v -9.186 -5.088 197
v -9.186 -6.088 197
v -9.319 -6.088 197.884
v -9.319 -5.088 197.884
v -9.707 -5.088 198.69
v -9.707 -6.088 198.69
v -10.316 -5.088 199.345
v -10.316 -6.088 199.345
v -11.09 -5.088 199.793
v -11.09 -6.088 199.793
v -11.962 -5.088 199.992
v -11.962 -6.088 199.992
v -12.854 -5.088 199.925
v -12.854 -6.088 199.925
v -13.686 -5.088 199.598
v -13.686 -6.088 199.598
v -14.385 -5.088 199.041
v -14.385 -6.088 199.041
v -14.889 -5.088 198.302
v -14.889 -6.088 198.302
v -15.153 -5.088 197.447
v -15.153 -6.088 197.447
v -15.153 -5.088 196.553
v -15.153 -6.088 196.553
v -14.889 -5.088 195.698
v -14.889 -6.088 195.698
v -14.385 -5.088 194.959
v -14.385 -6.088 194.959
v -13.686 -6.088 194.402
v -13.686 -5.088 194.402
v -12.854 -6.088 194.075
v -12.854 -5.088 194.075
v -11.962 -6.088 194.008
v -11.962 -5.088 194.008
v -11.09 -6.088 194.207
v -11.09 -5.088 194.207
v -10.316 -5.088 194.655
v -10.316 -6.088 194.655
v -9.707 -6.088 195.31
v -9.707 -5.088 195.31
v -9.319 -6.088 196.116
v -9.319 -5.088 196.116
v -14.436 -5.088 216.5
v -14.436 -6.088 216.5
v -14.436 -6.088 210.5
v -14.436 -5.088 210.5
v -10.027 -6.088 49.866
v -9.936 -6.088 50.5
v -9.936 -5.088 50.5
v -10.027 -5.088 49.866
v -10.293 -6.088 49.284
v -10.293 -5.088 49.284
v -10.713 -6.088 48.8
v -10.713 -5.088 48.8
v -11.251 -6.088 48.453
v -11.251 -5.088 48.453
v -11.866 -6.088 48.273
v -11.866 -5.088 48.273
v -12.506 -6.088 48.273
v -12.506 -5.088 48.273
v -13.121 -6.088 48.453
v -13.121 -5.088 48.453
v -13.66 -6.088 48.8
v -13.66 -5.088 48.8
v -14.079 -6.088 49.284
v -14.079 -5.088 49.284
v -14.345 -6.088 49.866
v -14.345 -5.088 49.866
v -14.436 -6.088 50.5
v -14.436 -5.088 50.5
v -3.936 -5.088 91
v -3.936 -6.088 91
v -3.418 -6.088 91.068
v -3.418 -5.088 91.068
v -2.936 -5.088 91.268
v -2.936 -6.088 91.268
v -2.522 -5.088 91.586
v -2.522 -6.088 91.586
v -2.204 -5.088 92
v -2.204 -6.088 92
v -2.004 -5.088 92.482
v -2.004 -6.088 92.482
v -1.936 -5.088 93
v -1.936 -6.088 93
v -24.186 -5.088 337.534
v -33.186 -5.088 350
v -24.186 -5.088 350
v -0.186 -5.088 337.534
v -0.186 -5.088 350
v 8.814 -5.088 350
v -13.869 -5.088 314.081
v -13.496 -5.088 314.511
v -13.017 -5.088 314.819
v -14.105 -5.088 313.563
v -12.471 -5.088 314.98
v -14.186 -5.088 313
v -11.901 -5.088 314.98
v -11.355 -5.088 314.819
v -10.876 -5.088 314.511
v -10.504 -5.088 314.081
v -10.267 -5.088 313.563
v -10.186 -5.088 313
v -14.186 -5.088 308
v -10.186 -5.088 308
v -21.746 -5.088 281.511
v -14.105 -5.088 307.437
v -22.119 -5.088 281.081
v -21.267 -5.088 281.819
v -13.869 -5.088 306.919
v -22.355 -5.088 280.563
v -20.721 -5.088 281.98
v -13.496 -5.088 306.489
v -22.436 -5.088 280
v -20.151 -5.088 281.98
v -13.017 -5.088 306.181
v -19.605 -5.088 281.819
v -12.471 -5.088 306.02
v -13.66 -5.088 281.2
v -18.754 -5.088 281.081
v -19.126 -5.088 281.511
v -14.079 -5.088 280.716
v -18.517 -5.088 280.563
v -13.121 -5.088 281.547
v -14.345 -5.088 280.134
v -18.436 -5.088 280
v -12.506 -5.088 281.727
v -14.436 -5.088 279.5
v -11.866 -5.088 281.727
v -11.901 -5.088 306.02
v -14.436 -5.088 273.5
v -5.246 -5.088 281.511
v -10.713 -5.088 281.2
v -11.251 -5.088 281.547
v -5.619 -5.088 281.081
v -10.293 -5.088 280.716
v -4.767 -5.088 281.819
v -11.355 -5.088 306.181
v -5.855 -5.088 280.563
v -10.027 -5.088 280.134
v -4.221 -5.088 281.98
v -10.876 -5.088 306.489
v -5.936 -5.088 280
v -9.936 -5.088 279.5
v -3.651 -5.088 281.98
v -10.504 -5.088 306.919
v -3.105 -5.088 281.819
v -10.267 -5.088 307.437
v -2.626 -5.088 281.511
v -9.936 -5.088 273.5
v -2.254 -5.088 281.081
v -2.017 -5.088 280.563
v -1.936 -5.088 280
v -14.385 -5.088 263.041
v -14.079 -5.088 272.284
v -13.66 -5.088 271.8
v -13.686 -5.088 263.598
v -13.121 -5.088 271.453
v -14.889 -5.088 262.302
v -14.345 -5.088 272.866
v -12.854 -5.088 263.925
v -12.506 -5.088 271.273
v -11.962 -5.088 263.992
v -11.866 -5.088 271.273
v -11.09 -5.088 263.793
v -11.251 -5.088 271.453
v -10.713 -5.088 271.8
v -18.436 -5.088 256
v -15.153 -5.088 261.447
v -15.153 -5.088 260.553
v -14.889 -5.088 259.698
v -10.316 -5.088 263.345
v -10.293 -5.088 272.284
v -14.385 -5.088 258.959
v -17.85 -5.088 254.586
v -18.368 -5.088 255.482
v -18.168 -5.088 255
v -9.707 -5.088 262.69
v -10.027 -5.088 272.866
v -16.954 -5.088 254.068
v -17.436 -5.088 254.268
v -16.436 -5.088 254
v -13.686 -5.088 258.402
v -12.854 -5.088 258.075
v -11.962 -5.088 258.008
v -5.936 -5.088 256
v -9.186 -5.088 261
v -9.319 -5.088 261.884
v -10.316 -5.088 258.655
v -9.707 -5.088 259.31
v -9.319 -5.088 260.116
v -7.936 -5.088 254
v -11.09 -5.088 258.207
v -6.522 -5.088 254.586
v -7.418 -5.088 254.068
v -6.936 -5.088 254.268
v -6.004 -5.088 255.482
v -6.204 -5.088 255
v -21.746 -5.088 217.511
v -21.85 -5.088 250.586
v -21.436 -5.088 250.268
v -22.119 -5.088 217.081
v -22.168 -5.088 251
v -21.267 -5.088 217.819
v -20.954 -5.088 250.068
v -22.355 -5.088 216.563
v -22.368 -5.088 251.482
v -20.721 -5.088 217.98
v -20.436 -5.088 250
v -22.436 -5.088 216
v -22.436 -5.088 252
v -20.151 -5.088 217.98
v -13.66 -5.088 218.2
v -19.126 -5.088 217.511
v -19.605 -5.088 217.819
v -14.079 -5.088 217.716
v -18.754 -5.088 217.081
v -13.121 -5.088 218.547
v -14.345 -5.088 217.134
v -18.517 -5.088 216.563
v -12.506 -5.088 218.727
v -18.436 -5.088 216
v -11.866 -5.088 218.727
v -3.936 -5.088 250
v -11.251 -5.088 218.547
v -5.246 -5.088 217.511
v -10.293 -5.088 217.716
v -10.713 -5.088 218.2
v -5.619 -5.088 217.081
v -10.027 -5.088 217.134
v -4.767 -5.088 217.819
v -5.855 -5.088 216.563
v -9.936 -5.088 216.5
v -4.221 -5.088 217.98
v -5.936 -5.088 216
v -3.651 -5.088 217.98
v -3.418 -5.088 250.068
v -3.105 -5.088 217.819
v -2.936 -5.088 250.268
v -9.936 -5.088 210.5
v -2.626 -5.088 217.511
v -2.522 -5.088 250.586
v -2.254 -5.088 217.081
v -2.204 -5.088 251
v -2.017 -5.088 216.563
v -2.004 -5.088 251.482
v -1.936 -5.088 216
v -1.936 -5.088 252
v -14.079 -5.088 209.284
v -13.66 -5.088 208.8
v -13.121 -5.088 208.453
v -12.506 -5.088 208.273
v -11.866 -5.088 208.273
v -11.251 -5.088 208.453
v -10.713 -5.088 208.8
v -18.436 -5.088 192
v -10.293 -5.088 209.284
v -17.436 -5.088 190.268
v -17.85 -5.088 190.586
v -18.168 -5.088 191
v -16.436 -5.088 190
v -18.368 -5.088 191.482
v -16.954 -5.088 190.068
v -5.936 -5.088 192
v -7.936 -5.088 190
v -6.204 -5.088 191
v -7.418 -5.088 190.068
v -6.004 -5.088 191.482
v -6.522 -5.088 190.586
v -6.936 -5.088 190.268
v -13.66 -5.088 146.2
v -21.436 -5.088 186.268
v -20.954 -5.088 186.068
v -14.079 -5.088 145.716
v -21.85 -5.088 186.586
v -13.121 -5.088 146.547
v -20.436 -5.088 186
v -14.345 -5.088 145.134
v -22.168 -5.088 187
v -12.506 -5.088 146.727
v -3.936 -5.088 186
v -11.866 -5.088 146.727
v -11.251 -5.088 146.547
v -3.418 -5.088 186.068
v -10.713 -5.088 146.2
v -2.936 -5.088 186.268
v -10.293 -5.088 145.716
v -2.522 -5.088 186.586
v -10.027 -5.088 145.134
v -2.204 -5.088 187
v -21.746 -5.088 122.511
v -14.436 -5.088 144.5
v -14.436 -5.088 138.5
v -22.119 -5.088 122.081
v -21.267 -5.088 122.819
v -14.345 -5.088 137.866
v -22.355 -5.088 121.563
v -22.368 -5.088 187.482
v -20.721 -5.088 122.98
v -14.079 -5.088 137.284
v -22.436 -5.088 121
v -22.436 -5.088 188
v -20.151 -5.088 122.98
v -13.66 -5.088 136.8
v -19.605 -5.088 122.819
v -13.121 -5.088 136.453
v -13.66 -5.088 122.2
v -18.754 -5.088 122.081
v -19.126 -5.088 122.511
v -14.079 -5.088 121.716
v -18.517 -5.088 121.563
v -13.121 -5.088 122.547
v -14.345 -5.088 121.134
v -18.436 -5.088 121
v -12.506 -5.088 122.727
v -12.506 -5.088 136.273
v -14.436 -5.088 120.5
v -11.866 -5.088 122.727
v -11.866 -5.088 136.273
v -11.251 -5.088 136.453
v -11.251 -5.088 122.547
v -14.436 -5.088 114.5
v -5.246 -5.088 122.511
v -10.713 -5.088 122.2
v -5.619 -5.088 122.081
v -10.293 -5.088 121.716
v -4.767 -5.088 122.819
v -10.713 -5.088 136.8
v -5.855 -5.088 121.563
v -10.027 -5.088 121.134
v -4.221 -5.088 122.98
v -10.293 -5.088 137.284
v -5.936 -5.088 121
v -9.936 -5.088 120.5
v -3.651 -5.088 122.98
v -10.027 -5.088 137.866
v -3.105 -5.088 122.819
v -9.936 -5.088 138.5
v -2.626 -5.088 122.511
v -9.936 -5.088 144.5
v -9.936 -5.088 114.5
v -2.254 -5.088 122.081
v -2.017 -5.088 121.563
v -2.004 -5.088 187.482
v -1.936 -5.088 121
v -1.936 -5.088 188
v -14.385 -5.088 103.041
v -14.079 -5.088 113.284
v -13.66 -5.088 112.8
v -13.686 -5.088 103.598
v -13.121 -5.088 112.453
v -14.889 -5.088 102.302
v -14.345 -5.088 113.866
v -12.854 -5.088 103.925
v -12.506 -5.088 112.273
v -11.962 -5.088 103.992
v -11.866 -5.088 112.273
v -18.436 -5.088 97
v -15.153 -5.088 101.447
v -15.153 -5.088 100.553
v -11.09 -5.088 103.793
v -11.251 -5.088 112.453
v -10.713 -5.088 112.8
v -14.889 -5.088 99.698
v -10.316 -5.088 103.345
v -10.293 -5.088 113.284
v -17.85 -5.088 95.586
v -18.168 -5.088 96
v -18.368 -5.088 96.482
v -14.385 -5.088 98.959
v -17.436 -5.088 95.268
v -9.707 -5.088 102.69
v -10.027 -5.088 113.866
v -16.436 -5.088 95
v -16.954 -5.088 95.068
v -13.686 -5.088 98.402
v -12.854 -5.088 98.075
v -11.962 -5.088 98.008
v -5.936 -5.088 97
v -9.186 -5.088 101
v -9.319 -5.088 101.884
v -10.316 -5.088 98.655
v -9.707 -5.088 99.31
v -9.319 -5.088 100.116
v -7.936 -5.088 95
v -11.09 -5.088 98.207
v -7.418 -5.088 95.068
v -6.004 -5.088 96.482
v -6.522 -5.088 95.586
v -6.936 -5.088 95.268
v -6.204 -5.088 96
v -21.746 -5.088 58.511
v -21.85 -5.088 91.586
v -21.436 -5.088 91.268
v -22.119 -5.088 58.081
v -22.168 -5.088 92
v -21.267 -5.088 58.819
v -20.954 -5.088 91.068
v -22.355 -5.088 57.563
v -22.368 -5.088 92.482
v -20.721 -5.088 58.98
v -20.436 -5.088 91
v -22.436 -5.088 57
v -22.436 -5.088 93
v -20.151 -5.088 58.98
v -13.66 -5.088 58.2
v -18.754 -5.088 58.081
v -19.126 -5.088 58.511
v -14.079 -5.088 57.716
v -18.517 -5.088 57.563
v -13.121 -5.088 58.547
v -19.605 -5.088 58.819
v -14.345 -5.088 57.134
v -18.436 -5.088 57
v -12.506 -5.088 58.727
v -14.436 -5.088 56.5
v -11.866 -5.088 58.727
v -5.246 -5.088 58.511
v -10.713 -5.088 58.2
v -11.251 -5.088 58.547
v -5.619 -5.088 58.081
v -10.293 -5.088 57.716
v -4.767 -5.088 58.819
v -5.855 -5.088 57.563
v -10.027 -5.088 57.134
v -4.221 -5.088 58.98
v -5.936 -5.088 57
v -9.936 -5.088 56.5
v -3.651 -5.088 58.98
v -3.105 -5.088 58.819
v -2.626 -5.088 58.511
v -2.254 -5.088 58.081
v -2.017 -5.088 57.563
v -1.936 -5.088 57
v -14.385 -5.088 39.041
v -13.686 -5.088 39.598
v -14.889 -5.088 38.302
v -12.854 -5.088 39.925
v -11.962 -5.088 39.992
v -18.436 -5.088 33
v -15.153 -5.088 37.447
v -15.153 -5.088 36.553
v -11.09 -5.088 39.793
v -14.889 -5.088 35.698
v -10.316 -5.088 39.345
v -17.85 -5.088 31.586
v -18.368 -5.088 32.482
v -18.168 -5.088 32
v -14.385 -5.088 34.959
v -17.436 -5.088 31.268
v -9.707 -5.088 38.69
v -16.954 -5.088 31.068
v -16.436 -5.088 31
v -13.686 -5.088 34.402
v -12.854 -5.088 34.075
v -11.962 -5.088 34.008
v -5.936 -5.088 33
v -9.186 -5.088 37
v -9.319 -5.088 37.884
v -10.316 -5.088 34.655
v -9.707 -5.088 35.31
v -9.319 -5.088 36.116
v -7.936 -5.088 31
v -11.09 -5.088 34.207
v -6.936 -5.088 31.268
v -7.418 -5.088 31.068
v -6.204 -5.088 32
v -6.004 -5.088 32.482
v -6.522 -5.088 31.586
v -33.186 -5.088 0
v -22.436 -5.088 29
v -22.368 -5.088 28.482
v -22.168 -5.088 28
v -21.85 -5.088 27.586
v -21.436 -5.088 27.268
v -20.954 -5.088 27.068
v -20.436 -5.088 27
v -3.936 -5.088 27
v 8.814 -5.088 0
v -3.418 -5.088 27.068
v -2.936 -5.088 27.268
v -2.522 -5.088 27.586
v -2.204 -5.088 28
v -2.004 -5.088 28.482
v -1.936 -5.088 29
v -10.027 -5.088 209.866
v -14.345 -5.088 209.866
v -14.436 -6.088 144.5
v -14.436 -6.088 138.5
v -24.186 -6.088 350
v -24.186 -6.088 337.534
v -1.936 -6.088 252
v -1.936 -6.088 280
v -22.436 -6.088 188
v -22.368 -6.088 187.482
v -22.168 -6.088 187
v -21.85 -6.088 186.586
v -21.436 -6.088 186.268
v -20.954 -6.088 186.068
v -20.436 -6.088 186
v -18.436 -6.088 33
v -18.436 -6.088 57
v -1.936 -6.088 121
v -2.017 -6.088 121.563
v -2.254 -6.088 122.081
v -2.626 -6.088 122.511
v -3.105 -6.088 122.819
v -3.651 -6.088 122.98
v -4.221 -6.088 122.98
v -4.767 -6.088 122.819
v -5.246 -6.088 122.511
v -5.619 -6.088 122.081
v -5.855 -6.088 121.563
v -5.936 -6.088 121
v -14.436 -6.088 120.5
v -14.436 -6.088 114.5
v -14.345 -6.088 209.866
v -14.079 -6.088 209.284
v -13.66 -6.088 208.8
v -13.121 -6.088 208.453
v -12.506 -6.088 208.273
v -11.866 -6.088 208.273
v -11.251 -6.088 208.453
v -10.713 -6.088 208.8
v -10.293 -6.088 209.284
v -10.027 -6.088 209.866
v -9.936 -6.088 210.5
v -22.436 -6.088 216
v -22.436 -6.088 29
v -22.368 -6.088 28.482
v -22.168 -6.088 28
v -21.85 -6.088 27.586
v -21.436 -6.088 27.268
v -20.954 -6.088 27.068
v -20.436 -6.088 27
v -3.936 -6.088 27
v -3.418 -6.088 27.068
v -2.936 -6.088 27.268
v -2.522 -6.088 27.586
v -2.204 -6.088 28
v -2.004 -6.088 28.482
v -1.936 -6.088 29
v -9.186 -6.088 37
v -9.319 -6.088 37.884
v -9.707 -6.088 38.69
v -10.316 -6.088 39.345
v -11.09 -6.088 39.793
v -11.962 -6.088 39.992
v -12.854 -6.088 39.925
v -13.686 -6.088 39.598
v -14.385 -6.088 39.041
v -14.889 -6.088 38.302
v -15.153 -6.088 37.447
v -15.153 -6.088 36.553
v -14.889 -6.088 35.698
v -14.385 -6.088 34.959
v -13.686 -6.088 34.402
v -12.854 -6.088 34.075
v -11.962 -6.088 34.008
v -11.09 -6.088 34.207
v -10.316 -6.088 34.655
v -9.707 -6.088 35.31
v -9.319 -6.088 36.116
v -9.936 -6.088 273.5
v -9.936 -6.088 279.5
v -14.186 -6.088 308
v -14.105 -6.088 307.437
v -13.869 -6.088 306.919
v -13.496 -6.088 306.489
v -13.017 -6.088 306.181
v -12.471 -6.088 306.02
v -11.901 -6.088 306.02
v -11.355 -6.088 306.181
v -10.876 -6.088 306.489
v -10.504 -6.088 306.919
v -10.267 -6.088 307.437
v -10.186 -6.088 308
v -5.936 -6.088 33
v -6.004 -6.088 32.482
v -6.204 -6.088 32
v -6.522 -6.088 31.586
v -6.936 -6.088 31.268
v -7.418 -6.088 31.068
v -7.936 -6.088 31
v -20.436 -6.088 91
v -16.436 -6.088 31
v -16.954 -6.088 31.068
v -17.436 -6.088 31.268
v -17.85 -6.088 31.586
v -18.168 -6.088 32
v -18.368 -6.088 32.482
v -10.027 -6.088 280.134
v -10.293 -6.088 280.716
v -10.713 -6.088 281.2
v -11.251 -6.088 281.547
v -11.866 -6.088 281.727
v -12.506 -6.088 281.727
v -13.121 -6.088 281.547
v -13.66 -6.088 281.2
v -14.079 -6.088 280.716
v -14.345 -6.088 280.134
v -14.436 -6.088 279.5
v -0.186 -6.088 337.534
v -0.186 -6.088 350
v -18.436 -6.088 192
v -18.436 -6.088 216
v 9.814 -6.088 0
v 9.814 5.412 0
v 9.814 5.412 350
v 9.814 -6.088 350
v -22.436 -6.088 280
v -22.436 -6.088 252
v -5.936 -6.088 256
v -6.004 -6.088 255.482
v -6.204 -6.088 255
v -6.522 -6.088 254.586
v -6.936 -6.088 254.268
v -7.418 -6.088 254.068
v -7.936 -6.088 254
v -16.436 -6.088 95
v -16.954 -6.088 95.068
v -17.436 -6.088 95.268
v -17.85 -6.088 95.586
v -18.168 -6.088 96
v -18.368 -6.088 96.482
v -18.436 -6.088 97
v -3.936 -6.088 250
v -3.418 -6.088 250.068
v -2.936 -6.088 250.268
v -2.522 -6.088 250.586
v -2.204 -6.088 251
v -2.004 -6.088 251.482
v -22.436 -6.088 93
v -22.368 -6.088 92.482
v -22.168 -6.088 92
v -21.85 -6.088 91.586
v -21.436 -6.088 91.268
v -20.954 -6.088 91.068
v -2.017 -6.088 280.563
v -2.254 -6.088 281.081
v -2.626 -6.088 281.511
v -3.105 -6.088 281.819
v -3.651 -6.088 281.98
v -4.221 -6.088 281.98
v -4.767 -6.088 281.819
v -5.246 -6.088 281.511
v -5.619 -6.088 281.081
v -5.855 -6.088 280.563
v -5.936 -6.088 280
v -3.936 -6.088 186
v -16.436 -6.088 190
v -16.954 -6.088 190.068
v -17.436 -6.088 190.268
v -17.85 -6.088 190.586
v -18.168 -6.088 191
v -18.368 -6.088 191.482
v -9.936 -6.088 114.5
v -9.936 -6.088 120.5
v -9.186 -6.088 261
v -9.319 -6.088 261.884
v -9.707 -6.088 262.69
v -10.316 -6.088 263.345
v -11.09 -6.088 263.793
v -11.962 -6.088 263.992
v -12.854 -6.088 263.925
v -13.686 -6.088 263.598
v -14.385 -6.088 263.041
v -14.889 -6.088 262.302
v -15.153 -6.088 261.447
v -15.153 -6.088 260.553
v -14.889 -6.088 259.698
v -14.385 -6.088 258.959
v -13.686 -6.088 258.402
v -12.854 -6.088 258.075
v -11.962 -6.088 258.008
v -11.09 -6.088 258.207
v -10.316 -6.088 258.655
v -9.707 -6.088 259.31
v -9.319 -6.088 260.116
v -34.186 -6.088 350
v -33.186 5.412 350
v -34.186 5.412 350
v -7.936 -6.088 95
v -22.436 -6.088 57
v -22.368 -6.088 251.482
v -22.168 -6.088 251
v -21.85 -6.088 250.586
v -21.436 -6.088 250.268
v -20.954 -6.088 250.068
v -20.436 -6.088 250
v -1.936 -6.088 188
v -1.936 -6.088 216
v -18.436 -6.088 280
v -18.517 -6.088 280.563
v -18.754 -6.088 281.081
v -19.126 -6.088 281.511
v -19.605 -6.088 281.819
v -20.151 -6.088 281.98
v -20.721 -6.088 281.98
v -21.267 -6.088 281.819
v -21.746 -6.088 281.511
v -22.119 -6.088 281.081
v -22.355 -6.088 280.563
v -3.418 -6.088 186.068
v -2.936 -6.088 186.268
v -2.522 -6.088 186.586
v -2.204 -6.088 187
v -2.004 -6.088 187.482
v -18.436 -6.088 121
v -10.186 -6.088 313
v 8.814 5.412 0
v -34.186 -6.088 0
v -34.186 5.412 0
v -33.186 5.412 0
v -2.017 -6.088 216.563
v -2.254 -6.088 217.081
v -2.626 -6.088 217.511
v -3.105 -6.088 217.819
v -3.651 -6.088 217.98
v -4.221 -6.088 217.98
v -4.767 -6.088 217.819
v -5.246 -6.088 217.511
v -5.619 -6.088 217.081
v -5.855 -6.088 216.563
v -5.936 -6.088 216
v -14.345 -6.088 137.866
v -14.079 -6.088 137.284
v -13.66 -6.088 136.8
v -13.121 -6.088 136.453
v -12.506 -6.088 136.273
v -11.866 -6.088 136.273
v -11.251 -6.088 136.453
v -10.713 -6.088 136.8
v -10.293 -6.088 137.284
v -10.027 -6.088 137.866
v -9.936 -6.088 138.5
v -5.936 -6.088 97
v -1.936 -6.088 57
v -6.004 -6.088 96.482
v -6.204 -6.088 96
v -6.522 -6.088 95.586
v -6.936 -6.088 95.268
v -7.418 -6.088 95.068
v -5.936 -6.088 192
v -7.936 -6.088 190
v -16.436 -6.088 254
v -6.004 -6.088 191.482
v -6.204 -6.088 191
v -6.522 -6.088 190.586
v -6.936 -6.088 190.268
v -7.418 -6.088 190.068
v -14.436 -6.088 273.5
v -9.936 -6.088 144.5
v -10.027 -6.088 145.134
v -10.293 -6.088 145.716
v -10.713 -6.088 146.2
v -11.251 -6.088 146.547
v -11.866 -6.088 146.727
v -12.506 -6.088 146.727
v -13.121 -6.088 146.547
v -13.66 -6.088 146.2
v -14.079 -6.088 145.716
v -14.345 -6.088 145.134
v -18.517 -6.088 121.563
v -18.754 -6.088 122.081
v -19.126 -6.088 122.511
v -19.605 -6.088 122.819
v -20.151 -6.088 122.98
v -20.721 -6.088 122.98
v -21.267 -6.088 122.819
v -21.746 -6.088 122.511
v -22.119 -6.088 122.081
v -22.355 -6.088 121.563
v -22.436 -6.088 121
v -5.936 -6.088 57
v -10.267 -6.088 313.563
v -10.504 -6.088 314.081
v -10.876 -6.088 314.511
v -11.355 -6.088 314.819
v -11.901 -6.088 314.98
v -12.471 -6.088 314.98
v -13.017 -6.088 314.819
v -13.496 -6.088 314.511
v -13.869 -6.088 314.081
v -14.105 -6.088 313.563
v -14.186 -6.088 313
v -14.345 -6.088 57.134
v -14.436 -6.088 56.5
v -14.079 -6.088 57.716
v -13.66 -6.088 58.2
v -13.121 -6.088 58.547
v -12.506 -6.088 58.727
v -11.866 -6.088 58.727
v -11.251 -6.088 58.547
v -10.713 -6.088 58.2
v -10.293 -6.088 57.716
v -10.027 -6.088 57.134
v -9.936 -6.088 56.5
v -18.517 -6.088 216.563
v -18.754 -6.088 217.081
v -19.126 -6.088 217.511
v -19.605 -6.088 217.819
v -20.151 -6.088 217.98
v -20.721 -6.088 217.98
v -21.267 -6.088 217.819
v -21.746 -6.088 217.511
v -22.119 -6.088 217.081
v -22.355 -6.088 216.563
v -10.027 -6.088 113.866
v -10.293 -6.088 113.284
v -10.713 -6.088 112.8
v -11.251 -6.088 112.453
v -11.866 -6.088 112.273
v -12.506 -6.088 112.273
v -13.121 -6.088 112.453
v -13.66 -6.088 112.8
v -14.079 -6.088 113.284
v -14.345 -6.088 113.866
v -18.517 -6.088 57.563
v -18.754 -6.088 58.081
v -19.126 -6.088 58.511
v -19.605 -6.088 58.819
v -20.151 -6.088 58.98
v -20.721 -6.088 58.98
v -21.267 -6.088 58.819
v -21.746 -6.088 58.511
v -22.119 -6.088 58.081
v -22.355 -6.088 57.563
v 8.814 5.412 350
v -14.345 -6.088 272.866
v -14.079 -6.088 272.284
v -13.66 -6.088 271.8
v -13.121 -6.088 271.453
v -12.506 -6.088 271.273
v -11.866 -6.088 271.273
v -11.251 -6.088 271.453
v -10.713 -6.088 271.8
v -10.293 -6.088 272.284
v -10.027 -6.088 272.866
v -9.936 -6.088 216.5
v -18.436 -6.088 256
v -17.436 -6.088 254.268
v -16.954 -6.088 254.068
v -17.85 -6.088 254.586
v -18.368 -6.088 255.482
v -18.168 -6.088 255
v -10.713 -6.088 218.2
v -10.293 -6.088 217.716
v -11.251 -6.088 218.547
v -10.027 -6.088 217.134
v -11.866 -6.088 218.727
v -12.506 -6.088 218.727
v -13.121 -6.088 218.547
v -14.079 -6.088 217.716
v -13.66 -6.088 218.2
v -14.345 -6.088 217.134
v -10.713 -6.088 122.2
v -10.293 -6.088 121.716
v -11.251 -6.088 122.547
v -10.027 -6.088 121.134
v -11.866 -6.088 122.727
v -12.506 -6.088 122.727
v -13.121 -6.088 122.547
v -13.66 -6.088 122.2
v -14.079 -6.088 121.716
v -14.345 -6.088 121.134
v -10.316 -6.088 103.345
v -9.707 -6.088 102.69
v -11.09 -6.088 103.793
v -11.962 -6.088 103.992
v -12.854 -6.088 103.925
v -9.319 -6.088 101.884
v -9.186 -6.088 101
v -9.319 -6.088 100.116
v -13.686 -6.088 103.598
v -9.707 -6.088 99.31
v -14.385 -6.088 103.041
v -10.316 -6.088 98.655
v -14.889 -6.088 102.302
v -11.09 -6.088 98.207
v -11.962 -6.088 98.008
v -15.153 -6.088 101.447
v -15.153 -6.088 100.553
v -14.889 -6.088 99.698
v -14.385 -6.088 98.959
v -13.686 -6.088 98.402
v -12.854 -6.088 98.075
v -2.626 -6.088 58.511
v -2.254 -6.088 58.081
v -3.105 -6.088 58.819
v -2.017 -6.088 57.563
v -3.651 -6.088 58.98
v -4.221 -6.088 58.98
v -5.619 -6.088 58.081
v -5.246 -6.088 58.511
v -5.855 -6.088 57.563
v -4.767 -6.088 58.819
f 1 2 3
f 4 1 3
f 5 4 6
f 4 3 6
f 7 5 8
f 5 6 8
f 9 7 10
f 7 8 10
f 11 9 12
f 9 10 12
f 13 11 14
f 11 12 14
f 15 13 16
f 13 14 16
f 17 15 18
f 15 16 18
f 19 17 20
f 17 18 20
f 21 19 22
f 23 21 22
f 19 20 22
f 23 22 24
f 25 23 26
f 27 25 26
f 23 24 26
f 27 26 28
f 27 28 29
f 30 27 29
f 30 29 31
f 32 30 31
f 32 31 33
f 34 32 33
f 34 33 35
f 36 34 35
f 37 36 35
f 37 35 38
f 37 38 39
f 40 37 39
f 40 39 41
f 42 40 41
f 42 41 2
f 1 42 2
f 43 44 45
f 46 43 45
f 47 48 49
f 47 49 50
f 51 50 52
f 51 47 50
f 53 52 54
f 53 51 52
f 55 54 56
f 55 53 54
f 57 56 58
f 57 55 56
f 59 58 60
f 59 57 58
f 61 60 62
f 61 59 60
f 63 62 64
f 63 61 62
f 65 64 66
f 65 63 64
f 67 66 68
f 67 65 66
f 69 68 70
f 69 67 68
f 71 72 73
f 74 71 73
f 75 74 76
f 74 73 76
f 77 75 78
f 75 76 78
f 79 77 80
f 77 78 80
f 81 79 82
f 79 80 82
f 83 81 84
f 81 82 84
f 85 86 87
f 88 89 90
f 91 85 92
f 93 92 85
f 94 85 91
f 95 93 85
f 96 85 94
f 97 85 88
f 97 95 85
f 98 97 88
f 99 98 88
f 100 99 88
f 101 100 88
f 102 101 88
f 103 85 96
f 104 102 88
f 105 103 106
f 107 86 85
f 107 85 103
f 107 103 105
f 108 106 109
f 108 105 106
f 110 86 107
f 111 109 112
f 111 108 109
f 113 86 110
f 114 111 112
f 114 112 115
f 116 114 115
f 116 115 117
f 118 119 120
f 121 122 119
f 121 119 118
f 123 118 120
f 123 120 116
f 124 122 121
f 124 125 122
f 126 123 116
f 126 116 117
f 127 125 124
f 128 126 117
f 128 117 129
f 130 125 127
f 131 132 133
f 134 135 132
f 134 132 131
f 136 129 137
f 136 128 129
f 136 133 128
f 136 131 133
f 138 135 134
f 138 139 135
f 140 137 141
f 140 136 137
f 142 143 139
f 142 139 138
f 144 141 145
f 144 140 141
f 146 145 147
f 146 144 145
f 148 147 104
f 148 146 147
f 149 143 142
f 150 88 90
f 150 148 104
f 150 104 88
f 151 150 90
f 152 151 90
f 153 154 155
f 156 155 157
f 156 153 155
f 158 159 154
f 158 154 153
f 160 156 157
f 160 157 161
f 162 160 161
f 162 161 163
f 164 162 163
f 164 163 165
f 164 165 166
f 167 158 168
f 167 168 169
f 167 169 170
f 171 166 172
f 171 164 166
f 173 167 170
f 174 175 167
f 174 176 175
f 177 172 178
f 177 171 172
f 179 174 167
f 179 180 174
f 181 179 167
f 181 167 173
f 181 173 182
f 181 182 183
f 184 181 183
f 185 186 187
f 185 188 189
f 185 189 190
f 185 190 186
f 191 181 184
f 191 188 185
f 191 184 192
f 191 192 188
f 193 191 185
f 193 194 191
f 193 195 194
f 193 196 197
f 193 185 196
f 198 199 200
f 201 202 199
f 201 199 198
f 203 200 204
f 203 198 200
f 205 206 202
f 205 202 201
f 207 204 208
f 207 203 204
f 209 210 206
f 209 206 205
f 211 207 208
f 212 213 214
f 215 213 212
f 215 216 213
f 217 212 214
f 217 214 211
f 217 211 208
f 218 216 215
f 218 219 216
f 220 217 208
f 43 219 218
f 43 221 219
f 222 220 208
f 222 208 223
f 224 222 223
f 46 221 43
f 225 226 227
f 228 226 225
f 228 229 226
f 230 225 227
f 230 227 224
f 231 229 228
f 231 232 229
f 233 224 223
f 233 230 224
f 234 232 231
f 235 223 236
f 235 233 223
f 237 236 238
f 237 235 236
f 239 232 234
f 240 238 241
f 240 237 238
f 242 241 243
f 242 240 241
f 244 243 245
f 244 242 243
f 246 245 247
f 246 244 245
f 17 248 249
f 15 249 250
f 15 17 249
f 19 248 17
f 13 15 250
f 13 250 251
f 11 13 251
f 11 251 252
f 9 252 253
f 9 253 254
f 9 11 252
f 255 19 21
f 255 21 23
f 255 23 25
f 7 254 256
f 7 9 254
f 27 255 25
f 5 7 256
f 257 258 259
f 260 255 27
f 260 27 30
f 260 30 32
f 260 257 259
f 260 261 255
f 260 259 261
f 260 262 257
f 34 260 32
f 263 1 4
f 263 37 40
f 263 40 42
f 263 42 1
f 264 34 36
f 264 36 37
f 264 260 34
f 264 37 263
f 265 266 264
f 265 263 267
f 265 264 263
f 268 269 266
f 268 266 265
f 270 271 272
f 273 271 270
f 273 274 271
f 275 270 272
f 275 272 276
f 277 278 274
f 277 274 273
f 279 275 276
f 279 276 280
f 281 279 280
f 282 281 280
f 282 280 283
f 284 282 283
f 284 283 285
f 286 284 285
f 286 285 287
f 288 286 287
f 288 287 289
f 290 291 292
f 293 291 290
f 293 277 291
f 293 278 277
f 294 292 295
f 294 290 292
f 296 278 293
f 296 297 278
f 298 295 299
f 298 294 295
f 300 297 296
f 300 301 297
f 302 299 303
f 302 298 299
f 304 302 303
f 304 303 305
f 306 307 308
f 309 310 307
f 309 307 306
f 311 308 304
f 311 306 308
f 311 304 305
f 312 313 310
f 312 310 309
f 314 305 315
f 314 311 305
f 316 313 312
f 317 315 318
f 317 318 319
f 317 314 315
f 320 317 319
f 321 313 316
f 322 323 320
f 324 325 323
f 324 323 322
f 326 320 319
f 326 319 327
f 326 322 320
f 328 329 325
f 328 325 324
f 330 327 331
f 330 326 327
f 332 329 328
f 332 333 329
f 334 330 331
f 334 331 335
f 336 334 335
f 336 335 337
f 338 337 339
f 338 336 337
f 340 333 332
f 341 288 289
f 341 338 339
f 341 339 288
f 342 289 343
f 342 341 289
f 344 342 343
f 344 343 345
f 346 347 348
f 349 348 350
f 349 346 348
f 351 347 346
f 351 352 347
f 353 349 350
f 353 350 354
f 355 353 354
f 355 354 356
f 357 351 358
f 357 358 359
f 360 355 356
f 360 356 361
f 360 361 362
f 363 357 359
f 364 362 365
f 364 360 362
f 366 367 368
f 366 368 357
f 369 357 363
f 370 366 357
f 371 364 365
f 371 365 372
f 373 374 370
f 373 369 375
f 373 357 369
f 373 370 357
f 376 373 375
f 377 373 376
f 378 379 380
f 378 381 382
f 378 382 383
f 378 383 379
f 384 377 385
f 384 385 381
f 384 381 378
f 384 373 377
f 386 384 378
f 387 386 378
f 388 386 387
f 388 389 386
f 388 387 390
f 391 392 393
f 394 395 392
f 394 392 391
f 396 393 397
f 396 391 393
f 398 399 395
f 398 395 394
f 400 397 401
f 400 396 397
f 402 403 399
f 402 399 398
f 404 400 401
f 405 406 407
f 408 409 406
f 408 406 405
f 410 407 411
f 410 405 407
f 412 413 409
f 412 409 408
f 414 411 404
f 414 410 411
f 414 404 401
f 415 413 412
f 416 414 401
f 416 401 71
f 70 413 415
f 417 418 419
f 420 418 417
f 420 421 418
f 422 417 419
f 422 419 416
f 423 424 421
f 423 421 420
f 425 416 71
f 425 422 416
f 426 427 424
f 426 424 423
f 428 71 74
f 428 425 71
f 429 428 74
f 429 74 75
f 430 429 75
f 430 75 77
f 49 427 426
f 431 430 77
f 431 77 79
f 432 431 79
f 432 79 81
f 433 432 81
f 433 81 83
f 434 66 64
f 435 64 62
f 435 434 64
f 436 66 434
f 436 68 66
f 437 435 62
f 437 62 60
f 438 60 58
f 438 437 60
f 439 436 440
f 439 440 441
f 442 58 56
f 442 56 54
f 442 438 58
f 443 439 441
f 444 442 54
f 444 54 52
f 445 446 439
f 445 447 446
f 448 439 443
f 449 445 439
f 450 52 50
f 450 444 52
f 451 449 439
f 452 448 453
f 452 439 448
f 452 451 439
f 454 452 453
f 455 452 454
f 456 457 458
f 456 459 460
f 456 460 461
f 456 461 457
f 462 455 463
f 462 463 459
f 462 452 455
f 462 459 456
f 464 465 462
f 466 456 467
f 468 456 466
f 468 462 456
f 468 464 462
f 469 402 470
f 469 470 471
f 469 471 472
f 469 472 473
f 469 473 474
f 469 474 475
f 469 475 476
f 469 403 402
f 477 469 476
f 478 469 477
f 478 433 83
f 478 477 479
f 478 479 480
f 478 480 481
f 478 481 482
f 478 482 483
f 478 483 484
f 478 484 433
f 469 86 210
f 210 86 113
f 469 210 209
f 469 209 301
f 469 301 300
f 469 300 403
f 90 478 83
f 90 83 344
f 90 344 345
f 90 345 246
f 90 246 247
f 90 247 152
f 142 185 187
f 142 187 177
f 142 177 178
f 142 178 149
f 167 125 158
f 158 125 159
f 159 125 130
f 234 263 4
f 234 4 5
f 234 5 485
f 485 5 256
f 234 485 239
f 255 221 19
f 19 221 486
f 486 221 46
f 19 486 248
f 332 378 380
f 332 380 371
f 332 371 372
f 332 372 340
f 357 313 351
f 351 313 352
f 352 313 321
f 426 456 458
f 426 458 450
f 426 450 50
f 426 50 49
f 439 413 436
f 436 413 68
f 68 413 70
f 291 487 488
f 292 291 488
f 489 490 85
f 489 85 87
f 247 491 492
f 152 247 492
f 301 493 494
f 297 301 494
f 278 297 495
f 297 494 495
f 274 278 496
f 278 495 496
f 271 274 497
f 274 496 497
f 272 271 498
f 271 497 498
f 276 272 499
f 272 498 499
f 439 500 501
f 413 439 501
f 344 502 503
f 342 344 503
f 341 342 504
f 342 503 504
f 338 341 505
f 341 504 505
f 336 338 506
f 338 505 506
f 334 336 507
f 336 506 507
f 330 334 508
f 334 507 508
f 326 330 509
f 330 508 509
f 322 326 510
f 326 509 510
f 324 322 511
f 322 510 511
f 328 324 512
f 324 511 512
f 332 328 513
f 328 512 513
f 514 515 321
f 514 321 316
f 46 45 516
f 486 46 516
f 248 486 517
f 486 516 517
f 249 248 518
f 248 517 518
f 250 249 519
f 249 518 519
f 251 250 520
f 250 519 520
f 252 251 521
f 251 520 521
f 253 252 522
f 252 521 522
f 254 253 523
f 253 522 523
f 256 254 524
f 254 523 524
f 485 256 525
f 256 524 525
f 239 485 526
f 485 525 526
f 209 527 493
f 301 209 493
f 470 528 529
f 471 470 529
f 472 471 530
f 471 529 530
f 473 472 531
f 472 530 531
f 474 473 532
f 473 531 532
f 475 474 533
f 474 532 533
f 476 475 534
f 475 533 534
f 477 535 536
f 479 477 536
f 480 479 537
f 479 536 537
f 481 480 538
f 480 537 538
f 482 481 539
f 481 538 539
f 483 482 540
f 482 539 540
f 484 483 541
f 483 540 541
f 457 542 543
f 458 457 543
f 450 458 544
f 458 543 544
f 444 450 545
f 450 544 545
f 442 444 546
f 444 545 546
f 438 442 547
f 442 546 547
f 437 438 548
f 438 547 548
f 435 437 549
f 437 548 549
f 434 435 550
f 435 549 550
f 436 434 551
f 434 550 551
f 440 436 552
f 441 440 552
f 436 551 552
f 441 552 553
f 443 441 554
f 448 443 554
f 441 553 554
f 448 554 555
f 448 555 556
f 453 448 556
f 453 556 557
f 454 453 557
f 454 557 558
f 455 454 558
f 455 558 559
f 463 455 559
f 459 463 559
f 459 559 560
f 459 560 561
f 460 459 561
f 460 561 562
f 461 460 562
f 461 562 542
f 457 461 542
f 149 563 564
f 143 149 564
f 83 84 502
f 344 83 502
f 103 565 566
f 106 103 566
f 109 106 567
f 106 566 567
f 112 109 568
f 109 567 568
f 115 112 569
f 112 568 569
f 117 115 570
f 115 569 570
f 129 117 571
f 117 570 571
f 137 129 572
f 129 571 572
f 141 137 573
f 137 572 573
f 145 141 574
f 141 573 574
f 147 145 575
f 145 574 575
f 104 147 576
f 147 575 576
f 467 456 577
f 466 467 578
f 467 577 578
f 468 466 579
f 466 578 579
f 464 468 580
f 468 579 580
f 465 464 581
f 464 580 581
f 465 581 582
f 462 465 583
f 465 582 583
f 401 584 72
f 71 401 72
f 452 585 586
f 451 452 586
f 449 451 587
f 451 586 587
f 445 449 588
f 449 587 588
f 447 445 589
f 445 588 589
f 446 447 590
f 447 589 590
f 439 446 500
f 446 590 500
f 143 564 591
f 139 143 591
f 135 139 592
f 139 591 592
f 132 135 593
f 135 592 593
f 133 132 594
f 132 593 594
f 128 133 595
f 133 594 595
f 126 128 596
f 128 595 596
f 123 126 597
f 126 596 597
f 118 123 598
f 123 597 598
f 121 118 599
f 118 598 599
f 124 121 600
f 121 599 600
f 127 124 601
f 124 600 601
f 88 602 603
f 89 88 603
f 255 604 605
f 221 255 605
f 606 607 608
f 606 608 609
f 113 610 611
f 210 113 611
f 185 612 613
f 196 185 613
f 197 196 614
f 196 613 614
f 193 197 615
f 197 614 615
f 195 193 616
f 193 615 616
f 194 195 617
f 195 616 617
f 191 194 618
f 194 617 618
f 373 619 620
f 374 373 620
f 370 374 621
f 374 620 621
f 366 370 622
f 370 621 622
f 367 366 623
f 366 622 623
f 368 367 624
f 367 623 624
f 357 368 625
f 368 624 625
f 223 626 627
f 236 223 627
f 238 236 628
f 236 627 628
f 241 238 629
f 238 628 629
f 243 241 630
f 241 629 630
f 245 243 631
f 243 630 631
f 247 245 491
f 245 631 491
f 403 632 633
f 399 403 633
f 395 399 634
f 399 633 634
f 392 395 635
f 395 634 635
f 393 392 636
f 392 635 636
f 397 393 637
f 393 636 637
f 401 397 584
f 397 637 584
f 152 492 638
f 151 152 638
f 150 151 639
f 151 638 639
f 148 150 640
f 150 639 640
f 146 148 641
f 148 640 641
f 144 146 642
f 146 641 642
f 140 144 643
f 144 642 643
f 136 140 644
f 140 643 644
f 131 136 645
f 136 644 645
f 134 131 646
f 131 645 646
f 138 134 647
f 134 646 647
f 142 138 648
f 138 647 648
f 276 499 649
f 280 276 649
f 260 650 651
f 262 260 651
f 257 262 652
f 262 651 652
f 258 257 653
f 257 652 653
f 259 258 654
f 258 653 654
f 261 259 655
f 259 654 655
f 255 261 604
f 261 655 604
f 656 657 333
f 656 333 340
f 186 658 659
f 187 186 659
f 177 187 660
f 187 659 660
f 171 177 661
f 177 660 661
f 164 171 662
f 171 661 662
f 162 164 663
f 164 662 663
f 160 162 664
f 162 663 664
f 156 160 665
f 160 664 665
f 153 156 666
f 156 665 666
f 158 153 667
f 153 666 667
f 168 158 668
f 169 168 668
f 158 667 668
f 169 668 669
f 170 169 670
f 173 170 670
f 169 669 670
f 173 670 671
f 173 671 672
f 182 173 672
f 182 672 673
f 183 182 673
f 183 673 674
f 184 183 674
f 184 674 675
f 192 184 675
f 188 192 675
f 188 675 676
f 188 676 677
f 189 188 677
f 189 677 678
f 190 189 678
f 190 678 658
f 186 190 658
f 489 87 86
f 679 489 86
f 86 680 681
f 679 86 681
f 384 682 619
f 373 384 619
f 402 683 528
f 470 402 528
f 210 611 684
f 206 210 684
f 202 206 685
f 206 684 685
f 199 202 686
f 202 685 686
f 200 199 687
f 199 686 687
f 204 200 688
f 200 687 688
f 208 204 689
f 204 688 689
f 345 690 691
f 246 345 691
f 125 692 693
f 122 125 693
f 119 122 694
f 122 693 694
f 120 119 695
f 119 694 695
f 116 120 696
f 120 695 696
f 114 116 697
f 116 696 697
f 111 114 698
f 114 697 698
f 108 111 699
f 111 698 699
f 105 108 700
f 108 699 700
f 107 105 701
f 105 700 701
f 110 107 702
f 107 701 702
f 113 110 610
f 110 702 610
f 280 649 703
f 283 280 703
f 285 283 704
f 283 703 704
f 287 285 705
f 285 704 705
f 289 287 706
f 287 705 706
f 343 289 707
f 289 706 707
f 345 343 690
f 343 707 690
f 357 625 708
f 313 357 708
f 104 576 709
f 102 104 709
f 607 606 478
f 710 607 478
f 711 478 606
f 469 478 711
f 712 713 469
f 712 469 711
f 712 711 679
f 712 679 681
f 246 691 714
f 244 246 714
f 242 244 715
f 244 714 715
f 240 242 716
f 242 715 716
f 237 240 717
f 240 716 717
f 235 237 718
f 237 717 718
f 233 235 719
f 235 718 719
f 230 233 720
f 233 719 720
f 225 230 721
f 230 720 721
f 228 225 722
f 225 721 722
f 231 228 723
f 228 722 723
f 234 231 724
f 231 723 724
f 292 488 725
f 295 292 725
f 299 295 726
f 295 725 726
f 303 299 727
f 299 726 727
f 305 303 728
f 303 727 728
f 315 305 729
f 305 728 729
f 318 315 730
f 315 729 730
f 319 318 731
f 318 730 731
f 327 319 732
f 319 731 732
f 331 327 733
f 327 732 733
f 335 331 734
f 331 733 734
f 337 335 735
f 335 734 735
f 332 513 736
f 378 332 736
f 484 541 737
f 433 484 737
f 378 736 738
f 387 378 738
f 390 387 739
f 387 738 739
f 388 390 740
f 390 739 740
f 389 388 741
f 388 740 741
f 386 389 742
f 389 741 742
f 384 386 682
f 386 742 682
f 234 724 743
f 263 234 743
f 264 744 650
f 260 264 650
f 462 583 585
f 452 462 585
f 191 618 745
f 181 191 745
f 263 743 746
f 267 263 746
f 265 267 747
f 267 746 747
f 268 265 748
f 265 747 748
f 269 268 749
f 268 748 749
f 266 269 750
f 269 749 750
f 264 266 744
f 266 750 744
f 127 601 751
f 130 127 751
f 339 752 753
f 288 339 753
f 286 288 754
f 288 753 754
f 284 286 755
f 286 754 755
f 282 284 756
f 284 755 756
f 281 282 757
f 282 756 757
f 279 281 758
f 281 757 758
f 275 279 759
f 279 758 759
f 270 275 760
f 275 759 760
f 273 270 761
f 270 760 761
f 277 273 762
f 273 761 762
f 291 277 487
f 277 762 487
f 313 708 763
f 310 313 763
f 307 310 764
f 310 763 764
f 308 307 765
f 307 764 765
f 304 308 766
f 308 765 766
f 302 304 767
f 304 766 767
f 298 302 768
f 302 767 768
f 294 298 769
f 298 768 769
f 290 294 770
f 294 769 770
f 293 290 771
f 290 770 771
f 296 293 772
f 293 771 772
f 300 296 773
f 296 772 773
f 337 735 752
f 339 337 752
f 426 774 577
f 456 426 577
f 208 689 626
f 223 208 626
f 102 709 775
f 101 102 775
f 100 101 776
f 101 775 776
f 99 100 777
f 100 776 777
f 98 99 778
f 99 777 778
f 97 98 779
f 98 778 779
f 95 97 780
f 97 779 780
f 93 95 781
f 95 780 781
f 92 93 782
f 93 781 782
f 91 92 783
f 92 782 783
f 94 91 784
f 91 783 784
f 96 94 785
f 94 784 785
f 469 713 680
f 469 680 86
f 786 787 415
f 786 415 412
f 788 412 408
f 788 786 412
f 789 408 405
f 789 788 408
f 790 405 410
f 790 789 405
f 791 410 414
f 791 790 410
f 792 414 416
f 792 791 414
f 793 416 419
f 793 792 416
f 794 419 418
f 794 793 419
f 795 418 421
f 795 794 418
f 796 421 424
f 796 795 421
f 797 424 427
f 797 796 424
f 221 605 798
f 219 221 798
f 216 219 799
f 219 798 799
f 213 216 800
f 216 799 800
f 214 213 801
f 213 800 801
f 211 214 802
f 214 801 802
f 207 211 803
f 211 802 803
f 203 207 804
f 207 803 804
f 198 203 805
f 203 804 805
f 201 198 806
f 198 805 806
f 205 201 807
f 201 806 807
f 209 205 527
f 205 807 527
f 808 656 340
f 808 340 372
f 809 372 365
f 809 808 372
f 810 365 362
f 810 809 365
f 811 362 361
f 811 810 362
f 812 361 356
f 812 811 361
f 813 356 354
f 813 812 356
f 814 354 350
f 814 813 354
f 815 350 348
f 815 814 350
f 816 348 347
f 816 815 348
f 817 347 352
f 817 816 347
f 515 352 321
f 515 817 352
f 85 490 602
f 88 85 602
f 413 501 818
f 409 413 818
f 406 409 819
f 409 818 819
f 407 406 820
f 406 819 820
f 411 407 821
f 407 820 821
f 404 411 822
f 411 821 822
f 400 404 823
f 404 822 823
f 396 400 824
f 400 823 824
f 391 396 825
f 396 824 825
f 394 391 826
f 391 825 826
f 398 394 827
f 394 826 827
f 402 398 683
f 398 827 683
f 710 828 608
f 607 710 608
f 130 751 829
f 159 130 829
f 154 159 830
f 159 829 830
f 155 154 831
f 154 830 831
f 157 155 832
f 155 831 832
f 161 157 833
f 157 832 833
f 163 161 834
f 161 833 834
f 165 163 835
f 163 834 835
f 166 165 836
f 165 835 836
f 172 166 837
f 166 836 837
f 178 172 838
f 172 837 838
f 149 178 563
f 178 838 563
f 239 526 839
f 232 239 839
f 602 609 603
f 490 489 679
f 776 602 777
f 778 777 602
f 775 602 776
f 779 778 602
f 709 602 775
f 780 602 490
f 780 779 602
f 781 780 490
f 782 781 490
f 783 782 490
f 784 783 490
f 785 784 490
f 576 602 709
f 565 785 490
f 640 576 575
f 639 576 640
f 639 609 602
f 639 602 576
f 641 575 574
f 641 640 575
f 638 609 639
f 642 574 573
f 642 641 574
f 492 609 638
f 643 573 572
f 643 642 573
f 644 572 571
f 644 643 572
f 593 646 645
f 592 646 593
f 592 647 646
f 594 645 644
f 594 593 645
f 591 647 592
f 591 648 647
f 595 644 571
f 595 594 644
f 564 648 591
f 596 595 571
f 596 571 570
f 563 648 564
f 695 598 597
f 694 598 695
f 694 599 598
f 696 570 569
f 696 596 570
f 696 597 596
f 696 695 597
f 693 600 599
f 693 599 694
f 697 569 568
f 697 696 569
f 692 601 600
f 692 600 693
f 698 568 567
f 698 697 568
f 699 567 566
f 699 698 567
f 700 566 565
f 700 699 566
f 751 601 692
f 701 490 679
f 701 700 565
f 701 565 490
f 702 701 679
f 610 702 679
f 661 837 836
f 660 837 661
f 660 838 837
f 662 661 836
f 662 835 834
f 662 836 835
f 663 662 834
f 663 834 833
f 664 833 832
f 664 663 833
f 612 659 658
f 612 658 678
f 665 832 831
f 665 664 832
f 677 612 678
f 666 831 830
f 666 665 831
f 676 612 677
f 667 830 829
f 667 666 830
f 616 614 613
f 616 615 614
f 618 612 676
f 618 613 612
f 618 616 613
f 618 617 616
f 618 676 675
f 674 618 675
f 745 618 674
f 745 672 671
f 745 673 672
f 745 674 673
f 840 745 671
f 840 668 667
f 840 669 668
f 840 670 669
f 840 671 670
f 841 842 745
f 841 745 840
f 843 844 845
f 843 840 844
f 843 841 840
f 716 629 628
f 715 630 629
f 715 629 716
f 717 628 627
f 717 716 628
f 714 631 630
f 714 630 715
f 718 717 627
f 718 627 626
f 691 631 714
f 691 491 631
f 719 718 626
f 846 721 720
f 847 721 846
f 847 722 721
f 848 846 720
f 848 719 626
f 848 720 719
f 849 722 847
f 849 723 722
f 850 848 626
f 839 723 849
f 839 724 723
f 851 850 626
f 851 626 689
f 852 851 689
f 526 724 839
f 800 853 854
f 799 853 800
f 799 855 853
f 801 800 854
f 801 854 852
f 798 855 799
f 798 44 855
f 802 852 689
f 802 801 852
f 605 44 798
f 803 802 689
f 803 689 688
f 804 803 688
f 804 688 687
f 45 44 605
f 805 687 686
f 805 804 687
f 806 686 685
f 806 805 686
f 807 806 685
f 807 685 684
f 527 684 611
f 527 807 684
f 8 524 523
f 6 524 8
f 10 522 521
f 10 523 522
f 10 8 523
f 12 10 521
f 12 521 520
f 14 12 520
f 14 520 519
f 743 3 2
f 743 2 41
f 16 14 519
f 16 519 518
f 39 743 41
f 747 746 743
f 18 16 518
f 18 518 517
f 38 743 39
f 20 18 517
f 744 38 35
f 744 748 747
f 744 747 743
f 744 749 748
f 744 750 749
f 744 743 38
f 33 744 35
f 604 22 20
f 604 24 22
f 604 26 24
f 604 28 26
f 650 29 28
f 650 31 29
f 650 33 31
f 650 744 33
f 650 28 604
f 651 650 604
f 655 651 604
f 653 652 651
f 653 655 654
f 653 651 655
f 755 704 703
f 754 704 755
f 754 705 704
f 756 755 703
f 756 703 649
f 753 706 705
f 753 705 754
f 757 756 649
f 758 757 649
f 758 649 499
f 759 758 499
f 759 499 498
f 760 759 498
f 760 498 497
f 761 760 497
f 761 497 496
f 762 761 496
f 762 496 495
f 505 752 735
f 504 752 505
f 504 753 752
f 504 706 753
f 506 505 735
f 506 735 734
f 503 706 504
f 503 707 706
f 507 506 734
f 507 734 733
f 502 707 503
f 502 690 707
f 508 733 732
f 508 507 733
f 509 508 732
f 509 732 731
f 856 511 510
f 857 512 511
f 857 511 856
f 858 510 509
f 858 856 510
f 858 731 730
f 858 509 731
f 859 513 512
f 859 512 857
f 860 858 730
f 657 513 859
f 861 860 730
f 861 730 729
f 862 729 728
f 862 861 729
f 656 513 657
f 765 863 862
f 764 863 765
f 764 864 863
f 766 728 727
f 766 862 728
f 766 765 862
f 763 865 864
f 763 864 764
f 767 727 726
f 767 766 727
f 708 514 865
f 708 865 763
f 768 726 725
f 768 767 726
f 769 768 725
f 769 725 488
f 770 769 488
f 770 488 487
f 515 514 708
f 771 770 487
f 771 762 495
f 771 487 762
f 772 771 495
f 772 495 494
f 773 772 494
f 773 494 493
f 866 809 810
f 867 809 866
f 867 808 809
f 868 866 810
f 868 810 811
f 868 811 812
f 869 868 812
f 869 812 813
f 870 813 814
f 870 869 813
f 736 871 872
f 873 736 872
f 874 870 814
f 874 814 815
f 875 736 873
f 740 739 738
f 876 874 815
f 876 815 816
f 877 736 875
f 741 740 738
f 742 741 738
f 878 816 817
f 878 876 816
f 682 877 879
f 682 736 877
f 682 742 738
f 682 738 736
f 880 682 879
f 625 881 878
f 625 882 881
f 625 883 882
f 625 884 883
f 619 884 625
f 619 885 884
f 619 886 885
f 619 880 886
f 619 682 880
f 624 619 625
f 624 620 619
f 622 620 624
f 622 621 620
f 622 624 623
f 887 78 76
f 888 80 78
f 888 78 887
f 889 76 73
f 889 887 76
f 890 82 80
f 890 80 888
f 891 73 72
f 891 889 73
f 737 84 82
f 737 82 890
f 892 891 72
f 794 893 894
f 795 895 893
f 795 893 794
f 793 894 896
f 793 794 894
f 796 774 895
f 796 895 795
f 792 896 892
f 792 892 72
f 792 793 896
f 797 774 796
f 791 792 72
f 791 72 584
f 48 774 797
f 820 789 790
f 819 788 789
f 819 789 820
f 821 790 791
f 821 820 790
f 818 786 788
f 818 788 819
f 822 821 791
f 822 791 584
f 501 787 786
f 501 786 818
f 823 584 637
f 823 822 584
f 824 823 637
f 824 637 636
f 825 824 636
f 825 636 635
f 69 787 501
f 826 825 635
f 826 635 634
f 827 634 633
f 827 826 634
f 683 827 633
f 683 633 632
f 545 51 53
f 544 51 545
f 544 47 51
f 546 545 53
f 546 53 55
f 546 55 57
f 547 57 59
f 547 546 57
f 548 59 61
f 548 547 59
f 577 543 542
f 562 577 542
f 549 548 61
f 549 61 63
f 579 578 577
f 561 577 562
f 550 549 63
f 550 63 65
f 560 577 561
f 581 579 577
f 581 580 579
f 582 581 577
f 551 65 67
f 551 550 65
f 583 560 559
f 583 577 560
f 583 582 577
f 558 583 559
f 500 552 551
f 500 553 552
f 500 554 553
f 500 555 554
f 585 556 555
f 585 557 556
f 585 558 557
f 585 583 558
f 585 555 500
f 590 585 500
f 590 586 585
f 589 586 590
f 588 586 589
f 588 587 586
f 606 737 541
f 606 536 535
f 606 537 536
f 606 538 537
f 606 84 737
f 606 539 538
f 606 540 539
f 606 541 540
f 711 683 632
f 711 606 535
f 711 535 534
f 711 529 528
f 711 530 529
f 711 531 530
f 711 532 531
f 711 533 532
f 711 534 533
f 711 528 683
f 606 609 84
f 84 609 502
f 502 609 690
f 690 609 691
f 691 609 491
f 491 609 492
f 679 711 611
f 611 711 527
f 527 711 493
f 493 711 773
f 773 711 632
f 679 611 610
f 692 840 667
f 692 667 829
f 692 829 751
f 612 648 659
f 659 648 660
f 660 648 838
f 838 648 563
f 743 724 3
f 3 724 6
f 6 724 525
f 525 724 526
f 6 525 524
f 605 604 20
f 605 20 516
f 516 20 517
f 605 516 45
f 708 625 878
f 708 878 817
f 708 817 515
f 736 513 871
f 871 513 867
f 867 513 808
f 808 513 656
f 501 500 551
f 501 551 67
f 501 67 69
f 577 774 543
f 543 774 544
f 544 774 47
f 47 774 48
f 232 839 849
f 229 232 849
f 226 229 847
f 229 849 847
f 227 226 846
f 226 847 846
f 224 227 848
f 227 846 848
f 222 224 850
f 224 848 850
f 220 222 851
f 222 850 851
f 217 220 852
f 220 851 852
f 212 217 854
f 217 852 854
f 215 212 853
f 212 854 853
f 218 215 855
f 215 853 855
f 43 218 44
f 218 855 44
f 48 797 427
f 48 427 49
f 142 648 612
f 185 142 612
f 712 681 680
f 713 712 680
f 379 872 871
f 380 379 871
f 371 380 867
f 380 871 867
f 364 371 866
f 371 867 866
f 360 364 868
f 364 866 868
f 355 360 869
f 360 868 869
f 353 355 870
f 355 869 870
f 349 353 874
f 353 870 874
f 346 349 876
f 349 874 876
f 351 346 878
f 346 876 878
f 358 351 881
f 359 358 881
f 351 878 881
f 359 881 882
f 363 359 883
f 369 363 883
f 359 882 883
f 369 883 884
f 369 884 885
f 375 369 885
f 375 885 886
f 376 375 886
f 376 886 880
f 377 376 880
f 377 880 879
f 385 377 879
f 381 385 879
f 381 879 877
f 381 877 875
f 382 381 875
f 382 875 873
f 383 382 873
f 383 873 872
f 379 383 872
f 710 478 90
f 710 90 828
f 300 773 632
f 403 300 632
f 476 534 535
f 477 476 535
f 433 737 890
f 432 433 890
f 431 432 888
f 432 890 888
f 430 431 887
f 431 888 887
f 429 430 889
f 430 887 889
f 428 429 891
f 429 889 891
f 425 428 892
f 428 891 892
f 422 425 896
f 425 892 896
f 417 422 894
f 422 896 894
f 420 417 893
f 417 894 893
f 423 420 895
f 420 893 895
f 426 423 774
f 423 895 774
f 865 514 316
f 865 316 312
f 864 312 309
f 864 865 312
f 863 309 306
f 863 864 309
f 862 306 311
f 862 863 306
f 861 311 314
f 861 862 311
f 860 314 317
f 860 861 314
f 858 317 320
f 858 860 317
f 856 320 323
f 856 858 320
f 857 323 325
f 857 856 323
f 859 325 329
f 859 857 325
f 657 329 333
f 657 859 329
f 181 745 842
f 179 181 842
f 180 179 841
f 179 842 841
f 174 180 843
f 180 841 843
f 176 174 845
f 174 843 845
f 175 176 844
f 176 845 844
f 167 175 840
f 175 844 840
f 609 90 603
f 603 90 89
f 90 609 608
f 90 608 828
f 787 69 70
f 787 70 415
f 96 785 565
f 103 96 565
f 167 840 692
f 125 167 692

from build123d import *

# Parameters (mm, degrees)
EXTRUDE_1_DEPTH     = 350
SKETCH_2_R          = 3
SKETCH_2_W          = 24
SKETCH_2_H          = 12.465583579
CUT_EXTRUDE_1_DEPTH = 350


with BuildPart() as part:
    # 草图1 → 凸台-拉伸1 (new body)
    with BuildSketch(Plane.XY):
        Polygon((-34.186090226, 5.411678692), (-33.186090226, 5.411678692), (-33.186090226, -5.088321308), (8.813909774, -5.088321308), (8.813909774, 5.411678692), (9.813909774, 5.411678692), (9.813909774, -6.088321308), (-34.186090226, -6.088321308), align=None)
    extrude(amount=EXTRUDE_1_DEPTH)

    # 草图2 → 切除-拉伸1 (cut)
    with BuildSketch(Plane.XZ.offset(6.088321308)):
        with Locations((-12.186090226, 261)):
            Circle(SKETCH_2_R)
        with Locations((-12.186090226, 197)):
            Circle(SKETCH_2_R)
        with Locations((-12.186090226, 101)):
            Circle(SKETCH_2_R)
        with Locations((-12.186090226, 37)):
            Circle(SKETCH_2_R)
        with BuildLine():
            Line((-22.436090226, 280), (-22.436090226, 252))
            ThreePointArc((-22.436090226, 252), (-21.850303788, 250.585786438), (-20.436090226, 250))
            Line((-20.436090226, 250), (-3.936090226, 250))
            ThreePointArc((-3.936090226, 250), (-2.521876663, 250.585786438), (-1.936090226, 252))
            Line((-1.936090226, 252), (-1.936090226, 280))
            ThreePointArc((-1.936090226, 280), (-3.936090226, 282), (-5.936090226, 280))
            Line((-5.936090226, 280), (-5.936090226, 256))
            ThreePointArc((-5.936090226, 256), (-6.521876663, 254.585786438), (-7.936090226, 254))
            Line((-7.936090226, 254), (-16.436090226, 254))
            ThreePointArc((-16.436090226, 254), (-17.850303788, 254.585786438), (-18.436090226, 256))
            Line((-18.436090226, 256), (-18.436090226, 280))
            ThreePointArc((-18.436090226, 280), (-20.436090226, 282), (-22.436090226, 280))
        make_face()
        with BuildLine():
            Line((-14.436090226, 279.5), (-14.436090226, 273.5))
            ThreePointArc((-14.436090226, 273.5), (-12.186090226, 271.25), (-9.936090226, 273.5))
            Line((-9.936090226, 273.5), (-9.936090226, 279.5))
            ThreePointArc((-9.936090226, 279.5), (-12.186090226, 281.75), (-14.436090226, 279.5))
        make_face()
        with BuildLine():
            Line((-5.936090226, 216), (-5.936090226, 192))
            ThreePointArc((-5.936090226, 192), (-6.521876663, 190.585786438), (-7.936090226, 190))
            Line((-7.936090226, 190), (-16.436090226, 190))
            ThreePointArc((-16.436090226, 190), (-17.850303788, 190.585786438), (-18.436090226, 192))
            Line((-18.436090226, 192), (-18.436090226, 216))
            ThreePointArc((-18.436090226, 216), (-20.436090226, 218), (-22.436090226, 216))
            Line((-22.436090226, 216), (-22.436090226, 188))
            ThreePointArc((-22.436090226, 188), (-21.850303788, 186.585786438), (-20.436090226, 186))
            Line((-20.436090226, 186), (-3.936090226, 186))
            ThreePointArc((-3.936090226, 186), (-2.521876663, 186.585786438), (-1.936090226, 188))
            Line((-1.936090226, 188), (-1.936090226, 216))
            ThreePointArc((-1.936090226, 216), (-3.936090226, 218), (-5.936090226, 216))
        make_face()
        with BuildLine():
            Line((-14.436090226, 216.5), (-14.436090226, 210.5))
            ThreePointArc((-14.436090226, 210.5), (-12.186090226, 208.25), (-9.936090226, 210.5))
            Line((-9.936090226, 210.5), (-9.936090226, 216.5))
            ThreePointArc((-9.936090226, 216.5), (-12.186090226, 218.75), (-14.436090226, 216.5))
        make_face()
        with BuildLine():
            Line((-20.436090226, 91), (-3.936090226, 91))
            ThreePointArc((-3.936090226, 91), (-2.521876663, 91.585786438), (-1.936090226, 93))
            Line((-1.936090226, 93), (-1.936090226, 121))
            ThreePointArc((-1.936090226, 121), (-3.936090226, 123), (-5.936090226, 121))
            Line((-5.936090226, 121), (-5.936090226, 97))
            ThreePointArc((-5.936090226, 97), (-6.521876663, 95.585786438), (-7.936090226, 95))
            Line((-7.936090226, 95), (-16.436090226, 95))
            ThreePointArc((-16.436090226, 95), (-17.850303788, 95.585786438), (-18.436090226, 97))
            Line((-18.436090226, 97), (-18.436090226, 121))
            ThreePointArc((-18.436090226, 121), (-20.436090226, 123), (-22.436090226, 121))
            Line((-22.436090226, 121), (-22.436090226, 93))
            ThreePointArc((-22.436090226, 93), (-21.850303788, 91.585786438), (-20.436090226, 91))
        make_face()
        with BuildLine():
            Line((-9.936090226, 120.5), (-9.936090226, 114.5))
            ThreePointArc((-9.936090226, 114.5), (-12.186090226, 112.25), (-14.436090226, 114.5))
            Line((-14.436090226, 114.5), (-14.436090226, 120.5))
            ThreePointArc((-14.436090226, 120.5), (-12.186090226, 122.75), (-9.936090226, 120.5))
        make_face()
        with BuildLine():
            Line((-20.436090226, 27), (-3.936090226, 27))
            ThreePointArc((-3.936090226, 27), (-2.521876663, 27.585786438), (-1.936090226, 29))
            Line((-1.936090226, 29), (-1.936090226, 57))
            ThreePointArc((-1.936090226, 57), (-3.936090226, 59), (-5.936090226, 57))
            Line((-5.936090226, 57), (-5.936090226, 33))
            ThreePointArc((-5.936090226, 33), (-6.521876663, 31.585786438), (-7.936090226, 31))
            Line((-7.936090226, 31), (-16.436090226, 31))
            ThreePointArc((-16.436090226, 31), (-17.850303788, 31.585786438), (-18.436090226, 33))
            Line((-18.436090226, 33), (-18.436090226, 57))
            ThreePointArc((-18.436090226, 57), (-20.436090226, 59), (-22.436090226, 57))
            Line((-22.436090226, 57), (-22.436090226, 29))
            ThreePointArc((-22.436090226, 29), (-21.850303788, 27.585786438), (-20.436090226, 27))
        make_face()
        with BuildLine():
            Line((-9.936090226, 56.5), (-9.936090226, 50.5))
            ThreePointArc((-9.936090226, 50.5), (-12.186090226, 48.25), (-14.436090226, 50.5))
            Line((-14.436090226, 50.5), (-14.436090226, 56.5))
            ThreePointArc((-14.436090226, 56.5), (-12.186090226, 58.75), (-9.936090226, 56.5))
        make_face()
        with BuildLine():
            Line((-14.186090226, 313), (-14.186090226, 308))
            ThreePointArc((-14.186090226, 308), (-12.186090226, 306), (-10.186090226, 308))
            Line((-10.186090226, 308), (-10.186090226, 313))
            ThreePointArc((-10.186090226, 313), (-12.186090226, 315), (-14.186090226, 313))
        make_face()
        with BuildLine():
            Line((-14.436090226, 144.5), (-14.436090226, 138.5))
            ThreePointArc((-14.436090226, 138.5), (-12.186090226, 136.25), (-9.936090226, 138.5))
            Line((-9.936090226, 138.5), (-9.936090226, 144.5))
            ThreePointArc((-9.936090226, 144.5), (-12.186090226, 146.75), (-14.436090226, 144.5))
        make_face()
        with Locations((-12.186090226, 343.767208211)):
            Rectangle(SKETCH_2_W, SKETCH_2_H)
    extrude(amount=-CUT_EXTRUDE_1_DEPTH, mode=Mode.SUBTRACT)


solid = part.part
